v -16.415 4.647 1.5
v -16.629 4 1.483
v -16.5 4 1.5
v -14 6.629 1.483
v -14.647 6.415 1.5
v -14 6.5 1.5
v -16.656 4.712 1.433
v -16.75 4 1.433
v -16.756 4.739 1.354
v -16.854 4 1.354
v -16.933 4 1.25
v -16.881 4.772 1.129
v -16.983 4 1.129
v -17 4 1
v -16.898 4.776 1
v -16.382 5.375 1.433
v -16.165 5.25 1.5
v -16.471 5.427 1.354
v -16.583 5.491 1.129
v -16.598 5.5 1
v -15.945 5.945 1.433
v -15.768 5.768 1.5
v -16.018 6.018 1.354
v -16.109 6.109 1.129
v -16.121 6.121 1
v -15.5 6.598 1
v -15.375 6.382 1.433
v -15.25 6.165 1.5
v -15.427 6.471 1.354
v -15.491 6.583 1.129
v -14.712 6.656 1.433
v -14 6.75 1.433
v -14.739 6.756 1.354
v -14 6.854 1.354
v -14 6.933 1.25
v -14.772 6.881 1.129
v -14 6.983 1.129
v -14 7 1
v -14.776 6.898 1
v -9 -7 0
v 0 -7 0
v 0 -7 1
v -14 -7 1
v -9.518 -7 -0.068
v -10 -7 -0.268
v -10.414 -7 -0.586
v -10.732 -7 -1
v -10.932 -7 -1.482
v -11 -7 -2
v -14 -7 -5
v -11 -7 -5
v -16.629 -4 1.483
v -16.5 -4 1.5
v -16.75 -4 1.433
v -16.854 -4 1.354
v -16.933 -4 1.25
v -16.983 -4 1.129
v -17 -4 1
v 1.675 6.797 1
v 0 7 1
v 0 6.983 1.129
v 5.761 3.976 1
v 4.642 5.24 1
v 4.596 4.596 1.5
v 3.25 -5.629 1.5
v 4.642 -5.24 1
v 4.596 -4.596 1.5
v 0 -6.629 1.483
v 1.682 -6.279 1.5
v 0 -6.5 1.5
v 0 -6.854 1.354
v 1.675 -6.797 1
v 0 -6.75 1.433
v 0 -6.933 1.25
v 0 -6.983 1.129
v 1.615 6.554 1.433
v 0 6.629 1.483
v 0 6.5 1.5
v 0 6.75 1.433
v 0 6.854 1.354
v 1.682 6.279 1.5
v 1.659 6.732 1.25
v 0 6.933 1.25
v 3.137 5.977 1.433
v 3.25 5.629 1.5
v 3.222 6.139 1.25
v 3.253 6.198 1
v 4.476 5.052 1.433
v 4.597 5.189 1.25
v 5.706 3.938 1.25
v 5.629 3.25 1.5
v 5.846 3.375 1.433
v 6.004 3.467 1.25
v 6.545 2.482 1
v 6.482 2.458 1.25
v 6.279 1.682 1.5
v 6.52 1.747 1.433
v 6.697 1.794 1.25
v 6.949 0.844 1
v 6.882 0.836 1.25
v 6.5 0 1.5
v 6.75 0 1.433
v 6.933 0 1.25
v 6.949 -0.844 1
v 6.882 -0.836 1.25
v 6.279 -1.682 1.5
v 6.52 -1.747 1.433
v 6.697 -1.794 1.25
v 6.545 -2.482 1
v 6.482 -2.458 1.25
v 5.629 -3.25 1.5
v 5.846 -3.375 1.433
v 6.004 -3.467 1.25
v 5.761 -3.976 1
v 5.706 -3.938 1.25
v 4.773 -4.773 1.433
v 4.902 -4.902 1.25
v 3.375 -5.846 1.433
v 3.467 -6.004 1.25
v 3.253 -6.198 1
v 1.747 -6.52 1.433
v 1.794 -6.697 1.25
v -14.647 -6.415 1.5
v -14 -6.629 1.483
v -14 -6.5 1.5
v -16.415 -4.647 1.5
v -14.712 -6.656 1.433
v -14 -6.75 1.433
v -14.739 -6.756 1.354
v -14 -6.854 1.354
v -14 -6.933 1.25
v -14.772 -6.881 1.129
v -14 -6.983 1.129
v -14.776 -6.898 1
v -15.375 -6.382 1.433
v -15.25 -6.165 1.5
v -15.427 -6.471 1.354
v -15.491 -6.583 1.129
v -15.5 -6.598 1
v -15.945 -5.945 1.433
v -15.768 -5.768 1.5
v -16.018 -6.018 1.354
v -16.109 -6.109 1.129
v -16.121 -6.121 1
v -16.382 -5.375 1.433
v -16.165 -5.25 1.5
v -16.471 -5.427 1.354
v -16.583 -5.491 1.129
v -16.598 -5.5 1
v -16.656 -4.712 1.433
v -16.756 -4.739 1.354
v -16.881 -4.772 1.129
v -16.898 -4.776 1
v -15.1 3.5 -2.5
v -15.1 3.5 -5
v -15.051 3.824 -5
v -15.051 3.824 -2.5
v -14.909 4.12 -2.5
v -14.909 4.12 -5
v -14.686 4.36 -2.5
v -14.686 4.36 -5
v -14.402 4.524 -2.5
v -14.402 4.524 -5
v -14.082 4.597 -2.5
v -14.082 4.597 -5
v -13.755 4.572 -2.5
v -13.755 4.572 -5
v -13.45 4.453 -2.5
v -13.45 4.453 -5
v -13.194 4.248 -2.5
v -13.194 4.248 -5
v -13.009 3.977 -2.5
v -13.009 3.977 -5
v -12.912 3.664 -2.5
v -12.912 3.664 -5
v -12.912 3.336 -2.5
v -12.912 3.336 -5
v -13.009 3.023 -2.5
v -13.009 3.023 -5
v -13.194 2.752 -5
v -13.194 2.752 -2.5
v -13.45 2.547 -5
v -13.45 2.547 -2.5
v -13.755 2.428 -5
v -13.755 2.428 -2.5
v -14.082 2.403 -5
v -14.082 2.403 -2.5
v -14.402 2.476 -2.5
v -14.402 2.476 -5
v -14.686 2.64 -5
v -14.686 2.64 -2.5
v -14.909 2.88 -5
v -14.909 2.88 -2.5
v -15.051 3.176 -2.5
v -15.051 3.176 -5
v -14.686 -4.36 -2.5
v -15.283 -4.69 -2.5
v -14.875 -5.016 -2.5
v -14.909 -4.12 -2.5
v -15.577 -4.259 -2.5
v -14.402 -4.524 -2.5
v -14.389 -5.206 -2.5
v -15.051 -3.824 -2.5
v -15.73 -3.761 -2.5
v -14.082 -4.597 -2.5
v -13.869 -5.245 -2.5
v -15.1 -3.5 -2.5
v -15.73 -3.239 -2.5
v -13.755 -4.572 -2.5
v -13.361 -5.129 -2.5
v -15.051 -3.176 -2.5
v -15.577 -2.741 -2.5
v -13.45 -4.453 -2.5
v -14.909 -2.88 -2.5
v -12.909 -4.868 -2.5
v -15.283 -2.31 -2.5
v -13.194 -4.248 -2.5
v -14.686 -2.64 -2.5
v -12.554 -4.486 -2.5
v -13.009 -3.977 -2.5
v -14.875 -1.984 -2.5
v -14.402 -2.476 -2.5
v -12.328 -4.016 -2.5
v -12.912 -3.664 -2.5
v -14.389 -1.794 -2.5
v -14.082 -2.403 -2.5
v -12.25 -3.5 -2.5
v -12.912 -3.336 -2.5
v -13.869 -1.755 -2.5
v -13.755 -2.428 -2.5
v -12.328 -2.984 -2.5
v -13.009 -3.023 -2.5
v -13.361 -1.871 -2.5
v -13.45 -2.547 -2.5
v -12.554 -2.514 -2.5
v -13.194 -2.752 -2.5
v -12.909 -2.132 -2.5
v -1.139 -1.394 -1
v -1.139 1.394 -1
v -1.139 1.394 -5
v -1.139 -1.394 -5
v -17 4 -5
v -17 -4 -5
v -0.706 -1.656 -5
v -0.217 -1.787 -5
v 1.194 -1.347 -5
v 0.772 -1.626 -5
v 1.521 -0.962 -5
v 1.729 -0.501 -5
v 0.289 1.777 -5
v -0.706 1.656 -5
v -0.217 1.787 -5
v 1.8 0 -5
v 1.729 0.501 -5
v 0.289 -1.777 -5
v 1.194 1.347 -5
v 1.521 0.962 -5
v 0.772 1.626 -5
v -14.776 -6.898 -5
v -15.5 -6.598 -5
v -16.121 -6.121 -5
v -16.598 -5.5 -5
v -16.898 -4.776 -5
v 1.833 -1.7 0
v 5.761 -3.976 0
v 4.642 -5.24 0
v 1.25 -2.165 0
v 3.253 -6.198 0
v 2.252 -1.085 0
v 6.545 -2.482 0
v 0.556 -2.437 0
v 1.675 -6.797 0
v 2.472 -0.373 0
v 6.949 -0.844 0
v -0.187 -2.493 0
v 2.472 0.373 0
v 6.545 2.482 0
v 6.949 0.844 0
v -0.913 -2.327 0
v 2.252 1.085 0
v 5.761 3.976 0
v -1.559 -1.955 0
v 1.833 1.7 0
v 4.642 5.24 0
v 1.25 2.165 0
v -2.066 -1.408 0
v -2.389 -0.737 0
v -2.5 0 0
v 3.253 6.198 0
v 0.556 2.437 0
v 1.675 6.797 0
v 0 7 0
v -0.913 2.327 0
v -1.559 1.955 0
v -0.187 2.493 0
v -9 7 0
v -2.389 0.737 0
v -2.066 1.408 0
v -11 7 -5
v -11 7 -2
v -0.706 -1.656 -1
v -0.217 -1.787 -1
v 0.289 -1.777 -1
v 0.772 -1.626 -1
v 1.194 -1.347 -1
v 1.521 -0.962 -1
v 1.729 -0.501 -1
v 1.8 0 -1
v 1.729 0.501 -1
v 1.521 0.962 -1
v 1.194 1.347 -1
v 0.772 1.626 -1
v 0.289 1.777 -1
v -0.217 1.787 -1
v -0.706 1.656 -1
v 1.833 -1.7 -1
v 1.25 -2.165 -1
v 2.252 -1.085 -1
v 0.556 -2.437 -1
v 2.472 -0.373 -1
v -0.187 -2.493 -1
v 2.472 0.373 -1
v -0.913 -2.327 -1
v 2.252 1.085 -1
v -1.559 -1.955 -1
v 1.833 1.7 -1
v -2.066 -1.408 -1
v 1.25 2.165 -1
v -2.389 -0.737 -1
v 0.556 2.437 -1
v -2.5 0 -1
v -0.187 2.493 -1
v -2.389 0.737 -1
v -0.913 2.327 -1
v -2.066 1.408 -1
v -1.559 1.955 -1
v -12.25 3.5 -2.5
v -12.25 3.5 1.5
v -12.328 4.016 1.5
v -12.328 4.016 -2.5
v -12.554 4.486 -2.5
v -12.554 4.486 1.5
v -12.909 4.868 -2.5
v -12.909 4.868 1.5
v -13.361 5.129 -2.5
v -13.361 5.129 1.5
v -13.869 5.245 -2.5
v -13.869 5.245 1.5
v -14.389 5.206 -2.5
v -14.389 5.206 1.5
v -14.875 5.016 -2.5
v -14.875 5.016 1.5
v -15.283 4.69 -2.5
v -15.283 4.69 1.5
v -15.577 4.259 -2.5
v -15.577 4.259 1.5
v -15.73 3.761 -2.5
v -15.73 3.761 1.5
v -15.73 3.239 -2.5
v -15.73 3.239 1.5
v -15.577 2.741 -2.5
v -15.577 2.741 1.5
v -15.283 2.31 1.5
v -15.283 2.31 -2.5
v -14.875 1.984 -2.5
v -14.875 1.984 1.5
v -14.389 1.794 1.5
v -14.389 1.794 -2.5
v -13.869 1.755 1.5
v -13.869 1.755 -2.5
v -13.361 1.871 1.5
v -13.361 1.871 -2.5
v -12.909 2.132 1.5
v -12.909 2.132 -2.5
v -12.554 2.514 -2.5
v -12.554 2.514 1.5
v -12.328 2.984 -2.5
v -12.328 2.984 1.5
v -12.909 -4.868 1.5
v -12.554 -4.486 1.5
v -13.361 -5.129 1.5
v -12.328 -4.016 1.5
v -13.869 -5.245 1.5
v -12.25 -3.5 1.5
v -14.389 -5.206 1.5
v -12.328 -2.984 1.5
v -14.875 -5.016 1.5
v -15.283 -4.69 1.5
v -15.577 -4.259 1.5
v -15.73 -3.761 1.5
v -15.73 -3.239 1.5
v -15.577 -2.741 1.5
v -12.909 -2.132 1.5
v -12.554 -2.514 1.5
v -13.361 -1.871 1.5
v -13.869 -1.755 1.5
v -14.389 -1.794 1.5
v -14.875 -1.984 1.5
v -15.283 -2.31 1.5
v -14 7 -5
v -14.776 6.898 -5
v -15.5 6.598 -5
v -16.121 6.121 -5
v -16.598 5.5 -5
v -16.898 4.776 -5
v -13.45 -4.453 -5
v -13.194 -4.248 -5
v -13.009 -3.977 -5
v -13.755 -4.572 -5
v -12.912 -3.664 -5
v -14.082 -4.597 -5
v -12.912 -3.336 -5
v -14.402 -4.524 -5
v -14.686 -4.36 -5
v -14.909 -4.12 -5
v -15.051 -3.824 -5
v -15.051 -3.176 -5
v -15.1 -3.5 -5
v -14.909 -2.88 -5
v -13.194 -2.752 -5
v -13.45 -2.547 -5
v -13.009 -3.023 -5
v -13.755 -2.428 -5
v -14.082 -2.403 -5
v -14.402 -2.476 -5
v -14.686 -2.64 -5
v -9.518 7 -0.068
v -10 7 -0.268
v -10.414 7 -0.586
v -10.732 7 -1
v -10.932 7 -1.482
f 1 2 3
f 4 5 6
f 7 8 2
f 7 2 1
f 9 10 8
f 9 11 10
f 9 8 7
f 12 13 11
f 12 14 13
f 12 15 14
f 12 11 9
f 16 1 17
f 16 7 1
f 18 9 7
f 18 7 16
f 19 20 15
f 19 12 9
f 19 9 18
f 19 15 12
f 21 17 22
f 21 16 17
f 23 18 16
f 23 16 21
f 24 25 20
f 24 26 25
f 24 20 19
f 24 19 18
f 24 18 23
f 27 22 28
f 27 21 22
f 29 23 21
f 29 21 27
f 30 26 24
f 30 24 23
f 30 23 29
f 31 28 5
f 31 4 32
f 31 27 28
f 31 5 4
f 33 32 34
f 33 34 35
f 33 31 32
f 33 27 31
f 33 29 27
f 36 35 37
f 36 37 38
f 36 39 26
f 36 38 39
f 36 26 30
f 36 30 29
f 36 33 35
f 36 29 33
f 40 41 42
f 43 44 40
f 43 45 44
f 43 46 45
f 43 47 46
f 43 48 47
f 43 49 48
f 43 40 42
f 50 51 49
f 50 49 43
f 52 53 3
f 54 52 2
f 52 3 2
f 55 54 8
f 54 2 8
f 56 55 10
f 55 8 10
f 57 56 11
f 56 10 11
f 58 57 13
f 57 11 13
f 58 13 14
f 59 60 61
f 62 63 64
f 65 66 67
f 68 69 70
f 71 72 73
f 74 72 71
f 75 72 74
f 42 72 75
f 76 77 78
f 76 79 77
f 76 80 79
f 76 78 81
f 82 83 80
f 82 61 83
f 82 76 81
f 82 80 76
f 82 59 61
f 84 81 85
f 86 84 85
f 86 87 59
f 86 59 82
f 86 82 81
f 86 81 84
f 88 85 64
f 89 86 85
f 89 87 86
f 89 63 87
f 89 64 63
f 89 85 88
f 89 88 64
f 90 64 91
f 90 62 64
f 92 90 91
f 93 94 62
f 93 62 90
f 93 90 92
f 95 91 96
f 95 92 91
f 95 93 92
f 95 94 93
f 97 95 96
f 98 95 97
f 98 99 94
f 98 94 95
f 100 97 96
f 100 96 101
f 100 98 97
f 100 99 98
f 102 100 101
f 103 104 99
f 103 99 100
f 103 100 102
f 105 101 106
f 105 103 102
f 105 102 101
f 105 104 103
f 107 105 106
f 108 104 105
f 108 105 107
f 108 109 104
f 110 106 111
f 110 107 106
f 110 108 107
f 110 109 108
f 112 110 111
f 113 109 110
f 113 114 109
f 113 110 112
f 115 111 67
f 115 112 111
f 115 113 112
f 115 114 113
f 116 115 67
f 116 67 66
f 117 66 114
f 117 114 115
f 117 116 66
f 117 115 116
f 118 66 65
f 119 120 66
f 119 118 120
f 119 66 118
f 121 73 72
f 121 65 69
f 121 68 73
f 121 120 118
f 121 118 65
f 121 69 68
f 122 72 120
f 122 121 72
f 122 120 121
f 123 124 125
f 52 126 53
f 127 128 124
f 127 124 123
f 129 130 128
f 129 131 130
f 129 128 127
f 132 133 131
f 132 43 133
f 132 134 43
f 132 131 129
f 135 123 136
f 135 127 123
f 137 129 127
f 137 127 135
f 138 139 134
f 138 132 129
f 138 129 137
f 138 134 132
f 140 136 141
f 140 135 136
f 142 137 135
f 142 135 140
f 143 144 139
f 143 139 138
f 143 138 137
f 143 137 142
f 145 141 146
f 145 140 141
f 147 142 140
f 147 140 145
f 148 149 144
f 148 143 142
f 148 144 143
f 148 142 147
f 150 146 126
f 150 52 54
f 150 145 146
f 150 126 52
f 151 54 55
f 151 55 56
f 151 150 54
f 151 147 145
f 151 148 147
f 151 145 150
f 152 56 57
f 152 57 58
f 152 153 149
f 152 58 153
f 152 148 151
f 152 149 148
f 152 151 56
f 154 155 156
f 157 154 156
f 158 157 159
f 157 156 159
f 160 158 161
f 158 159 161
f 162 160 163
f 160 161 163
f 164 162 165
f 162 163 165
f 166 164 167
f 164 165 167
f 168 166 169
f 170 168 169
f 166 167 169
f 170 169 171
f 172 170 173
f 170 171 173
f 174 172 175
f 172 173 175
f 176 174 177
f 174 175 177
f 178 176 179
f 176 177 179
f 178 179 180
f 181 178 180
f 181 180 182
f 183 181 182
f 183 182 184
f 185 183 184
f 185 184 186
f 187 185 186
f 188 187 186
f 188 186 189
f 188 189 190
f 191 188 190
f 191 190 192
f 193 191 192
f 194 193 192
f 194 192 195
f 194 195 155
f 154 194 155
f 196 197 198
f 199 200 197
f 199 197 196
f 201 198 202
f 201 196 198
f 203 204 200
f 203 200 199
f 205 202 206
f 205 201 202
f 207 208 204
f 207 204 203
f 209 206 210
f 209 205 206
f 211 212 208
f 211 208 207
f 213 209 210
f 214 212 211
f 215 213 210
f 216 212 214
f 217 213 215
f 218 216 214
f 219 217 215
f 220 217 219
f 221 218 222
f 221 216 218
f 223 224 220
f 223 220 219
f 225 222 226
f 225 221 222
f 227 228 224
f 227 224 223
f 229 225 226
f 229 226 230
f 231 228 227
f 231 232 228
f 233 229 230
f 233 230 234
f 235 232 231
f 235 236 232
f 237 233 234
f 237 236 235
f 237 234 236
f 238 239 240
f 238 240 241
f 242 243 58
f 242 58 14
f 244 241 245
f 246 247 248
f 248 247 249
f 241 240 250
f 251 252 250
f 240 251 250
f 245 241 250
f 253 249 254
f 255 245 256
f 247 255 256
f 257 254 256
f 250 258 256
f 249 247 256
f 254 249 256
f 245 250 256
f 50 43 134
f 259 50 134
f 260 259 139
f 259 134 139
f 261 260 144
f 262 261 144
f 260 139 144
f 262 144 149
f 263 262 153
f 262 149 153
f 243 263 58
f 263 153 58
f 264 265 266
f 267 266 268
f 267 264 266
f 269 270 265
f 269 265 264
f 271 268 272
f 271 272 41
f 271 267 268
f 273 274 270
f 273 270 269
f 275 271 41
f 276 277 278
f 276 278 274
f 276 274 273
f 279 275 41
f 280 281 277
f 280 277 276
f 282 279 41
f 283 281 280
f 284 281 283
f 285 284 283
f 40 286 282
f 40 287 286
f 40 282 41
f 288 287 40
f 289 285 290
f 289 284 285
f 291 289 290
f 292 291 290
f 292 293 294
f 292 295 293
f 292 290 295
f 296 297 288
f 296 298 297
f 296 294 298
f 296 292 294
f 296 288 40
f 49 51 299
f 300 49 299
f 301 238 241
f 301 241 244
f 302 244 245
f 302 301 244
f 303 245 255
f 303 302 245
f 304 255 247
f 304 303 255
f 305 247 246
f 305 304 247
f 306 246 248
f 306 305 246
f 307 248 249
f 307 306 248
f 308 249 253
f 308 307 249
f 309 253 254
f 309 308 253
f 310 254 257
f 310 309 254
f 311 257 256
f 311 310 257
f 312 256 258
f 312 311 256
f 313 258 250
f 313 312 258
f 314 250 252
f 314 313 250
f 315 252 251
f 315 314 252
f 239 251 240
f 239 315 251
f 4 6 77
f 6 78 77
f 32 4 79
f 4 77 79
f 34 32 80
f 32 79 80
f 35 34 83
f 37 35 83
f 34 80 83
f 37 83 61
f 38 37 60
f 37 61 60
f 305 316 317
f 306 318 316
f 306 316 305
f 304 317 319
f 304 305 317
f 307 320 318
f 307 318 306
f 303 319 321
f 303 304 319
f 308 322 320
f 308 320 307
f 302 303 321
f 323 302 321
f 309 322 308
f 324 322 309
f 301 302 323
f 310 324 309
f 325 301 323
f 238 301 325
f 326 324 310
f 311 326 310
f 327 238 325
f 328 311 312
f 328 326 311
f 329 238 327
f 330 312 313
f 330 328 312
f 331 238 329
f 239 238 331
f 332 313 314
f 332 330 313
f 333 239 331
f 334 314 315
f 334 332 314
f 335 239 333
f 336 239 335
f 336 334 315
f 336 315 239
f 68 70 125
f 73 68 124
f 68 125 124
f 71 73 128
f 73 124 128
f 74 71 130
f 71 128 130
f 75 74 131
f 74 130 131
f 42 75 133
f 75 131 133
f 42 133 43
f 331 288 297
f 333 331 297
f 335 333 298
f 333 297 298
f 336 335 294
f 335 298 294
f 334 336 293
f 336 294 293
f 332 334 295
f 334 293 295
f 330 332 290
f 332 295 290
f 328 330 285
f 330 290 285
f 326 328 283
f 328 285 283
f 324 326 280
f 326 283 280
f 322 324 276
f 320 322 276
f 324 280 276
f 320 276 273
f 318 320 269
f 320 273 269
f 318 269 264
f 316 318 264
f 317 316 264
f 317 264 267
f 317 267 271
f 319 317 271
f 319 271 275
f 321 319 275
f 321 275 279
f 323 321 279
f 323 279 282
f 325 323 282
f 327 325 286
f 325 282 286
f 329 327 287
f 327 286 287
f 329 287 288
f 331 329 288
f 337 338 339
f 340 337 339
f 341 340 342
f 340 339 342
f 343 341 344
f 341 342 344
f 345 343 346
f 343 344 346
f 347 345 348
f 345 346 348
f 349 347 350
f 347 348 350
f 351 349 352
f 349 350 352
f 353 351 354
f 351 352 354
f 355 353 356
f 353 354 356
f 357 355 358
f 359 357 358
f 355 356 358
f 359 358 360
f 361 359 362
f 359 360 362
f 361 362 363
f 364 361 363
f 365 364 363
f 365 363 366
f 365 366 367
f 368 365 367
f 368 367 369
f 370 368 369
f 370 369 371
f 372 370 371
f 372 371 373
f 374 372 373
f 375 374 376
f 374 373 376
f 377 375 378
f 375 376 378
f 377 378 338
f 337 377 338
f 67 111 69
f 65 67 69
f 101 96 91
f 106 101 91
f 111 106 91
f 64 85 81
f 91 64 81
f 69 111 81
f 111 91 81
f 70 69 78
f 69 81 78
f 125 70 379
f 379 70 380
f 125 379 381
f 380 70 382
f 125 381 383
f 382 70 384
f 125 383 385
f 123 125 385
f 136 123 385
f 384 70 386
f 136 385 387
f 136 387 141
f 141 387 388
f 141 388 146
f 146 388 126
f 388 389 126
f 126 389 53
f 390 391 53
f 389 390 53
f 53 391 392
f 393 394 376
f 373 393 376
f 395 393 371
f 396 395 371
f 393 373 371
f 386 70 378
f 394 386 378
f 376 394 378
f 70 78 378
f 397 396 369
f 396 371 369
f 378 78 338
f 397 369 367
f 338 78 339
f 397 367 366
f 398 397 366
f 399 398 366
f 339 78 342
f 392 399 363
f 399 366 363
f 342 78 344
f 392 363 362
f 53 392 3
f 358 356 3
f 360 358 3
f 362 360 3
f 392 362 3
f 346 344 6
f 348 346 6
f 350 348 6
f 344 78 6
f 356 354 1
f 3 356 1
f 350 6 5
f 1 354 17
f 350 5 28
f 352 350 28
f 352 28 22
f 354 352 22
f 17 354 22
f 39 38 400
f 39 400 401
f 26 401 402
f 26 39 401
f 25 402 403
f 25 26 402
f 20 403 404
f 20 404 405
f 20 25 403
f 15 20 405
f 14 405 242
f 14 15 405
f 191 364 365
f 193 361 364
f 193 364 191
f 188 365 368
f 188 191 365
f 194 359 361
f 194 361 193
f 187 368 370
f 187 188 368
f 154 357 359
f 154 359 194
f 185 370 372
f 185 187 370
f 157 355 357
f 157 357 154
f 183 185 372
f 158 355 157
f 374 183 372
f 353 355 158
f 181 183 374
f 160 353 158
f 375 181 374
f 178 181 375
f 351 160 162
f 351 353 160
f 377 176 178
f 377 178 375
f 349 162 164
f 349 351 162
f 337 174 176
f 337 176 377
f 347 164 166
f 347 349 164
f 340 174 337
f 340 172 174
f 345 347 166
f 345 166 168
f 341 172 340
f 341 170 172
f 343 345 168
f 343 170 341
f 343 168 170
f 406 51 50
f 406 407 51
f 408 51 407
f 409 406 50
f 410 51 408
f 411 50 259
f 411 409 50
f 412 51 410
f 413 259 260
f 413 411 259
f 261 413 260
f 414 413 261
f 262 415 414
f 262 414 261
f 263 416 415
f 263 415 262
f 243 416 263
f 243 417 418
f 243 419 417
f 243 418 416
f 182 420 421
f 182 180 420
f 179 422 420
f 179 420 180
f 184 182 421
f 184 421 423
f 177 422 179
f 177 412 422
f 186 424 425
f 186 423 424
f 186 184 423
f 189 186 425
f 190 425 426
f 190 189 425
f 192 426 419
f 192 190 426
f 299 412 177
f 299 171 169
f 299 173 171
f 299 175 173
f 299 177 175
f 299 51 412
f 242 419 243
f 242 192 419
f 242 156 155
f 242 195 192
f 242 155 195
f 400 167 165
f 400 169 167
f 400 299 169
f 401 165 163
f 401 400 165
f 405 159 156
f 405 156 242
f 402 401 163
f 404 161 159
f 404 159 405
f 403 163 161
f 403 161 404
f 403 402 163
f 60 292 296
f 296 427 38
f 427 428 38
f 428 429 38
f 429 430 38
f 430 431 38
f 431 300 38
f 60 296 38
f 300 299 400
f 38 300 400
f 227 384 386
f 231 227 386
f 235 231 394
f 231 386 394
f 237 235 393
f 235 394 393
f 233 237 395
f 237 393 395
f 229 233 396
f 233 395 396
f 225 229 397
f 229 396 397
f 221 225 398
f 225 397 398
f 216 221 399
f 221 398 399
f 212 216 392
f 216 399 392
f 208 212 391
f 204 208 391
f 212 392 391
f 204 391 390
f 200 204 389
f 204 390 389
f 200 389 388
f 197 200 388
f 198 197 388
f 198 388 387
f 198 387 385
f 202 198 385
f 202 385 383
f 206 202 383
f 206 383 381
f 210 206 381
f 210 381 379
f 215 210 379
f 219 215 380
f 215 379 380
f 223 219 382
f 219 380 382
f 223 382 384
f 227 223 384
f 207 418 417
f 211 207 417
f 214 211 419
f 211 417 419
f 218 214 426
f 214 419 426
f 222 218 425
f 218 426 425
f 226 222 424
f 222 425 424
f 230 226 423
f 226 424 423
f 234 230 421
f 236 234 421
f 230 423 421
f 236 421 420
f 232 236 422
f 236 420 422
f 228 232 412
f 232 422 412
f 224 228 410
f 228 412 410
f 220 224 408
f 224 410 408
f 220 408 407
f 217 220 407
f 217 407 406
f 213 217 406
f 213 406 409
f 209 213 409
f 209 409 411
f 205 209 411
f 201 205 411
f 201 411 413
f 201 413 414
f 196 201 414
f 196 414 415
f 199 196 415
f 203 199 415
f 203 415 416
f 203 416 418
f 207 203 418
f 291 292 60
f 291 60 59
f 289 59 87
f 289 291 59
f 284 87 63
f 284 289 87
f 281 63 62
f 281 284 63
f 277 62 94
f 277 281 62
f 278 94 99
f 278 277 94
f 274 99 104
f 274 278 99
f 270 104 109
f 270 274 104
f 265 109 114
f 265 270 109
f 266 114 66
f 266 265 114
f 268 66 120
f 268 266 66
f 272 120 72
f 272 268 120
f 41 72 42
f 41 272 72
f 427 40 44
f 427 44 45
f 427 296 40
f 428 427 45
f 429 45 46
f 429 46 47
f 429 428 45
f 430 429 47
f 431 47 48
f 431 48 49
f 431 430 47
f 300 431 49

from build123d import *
from build123d.topology import SkipClean

# Parameters (mm, degrees)
SKETCH1_R           = 1.1
BOSS_EXTRUDE1_DEPTH = 1.5
SKETCH2_R           = 2.5
BOSS_EXTRUDE2_DEPTH = 1
BOSS_EXTRUDE3_DEPTH = 4
BOSS_EXTRUDE4_START = 5
SKETCH4_W           = 6
SKETCH4_H           = 14
SKETCH4_R           = 1.1
BOSS_EXTRUDE4_DEPTH = 5
FILLET4_R           = 3
FILLET1_R           = 0.5
SKETCH5_R           = 1.75
CUT_EXTRUDE1_DEPTH  = 4
FILLET3_R           = 2


with BuildPart() as part:
    # Sketch1 → Boss-Extrude1 (new body)
    with BuildSketch(Plane.XY):
        with BuildLine():
            Line((-17, 7), (0, 7))
            ThreePointArc((0, 7), (7, 0), (0, -7))
            Line((0, -7), (-17, -7))
            Line((-17, -7), (-17, 7))
        make_face()
        with Locations((-14, 3.5)):
            Circle(SKETCH1_R, mode=Mode.SUBTRACT)
        with Locations(Location((-14, -3.5, 0), (0, 0, 180))):
            Circle(SKETCH1_R, mode=Mode.SUBTRACT)
    extrude(amount=BOSS_EXTRUDE1_DEPTH)

    # Sketch2 → Boss-Extrude2 (add)
    with BuildSketch(Plane(origin=(0, 0, 0), x_dir=(-1, 0, 0), z_dir=(0, 0, -1))):
        Circle(SKETCH2_R)
    extrude(amount=BOSS_EXTRUDE2_DEPTH)

    # Sketch3 → Boss-Extrude3 (add)
    with BuildSketch(Plane(origin=(0, 0, -1), x_dir=(-1, 0, 0), z_dir=(0, 0, -1))):
        with BuildLine():
            Line((1.13862177, 1.394109201), (1.13862177, -1.394109201))
            ThreePointArc((1.13862177, -1.394109201), (-1.8, 0), (1.13862177, 1.394109201))
        make_face()
    extrude(amount=BOSS_EXTRUDE3_DEPTH)

    # Sketch4 → Boss-Extrude4 (add)
    with SkipClean():  # the faces are left unmerged after this step: merging them gives an invalid solid
        with BuildSketch(Plane(origin=(0, 0, 0), x_dir=(-1, 0, 0), z_dir=(0, 0, -1)).offset(BOSS_EXTRUDE4_START)):
            with Locations((14, 0)):
                Rectangle(SKETCH4_W, SKETCH4_H)
            with Locations((14, 3.5)):
                Circle(SKETCH4_R, mode=Mode.SUBTRACT)
            with Locations((14, -3.5)):
                Circle(SKETCH4_R, mode=Mode.SUBTRACT)
        extrude(amount=-BOSS_EXTRUDE4_DEPTH)

    # Fillet4
    fillet4_edges = [part.edges().sort_by_distance(p)[0] for p in [
        (-17, -7, -2.5),
        (-17, 7, -2.5),
    ]]
    fillet(fillet4_edges, radius=FILLET4_R)

    # Fillet1
    fillet1_edges = [part.edges().sort_by_distance(p)[0] for p in [
        (7, 0, 1.5),
        (-17, 0, 1.5),
        (-7, -7, 1.5),
        (-16.121320344, -6.121320344, 1.5),
        (-16.121320344, 6.121320344, 1.5),
        (-7, 7, 1.5),
    ]]
    fillet(fillet1_edges, radius=FILLET1_R)

    # Sketch5 → Cut-Extrude1 (cut)
    with BuildSketch(Plane.XY.offset(1.5)):
        with Locations((-14, 3.5)):
            Circle(SKETCH5_R)
        with Locations((-14, -3.5)):
            Circle(SKETCH5_R)
    extrude(amount=-CUT_EXTRUDE1_DEPTH, mode=Mode.SUBTRACT)

    # Fillet3
    fillet3_edges = [part.edges().sort_by_distance(p)[0] for p in [
        (-11, 0, 0),
    ]]
    fillet(fillet3_edges, radius=FILLET3_R)


solid = part.part
